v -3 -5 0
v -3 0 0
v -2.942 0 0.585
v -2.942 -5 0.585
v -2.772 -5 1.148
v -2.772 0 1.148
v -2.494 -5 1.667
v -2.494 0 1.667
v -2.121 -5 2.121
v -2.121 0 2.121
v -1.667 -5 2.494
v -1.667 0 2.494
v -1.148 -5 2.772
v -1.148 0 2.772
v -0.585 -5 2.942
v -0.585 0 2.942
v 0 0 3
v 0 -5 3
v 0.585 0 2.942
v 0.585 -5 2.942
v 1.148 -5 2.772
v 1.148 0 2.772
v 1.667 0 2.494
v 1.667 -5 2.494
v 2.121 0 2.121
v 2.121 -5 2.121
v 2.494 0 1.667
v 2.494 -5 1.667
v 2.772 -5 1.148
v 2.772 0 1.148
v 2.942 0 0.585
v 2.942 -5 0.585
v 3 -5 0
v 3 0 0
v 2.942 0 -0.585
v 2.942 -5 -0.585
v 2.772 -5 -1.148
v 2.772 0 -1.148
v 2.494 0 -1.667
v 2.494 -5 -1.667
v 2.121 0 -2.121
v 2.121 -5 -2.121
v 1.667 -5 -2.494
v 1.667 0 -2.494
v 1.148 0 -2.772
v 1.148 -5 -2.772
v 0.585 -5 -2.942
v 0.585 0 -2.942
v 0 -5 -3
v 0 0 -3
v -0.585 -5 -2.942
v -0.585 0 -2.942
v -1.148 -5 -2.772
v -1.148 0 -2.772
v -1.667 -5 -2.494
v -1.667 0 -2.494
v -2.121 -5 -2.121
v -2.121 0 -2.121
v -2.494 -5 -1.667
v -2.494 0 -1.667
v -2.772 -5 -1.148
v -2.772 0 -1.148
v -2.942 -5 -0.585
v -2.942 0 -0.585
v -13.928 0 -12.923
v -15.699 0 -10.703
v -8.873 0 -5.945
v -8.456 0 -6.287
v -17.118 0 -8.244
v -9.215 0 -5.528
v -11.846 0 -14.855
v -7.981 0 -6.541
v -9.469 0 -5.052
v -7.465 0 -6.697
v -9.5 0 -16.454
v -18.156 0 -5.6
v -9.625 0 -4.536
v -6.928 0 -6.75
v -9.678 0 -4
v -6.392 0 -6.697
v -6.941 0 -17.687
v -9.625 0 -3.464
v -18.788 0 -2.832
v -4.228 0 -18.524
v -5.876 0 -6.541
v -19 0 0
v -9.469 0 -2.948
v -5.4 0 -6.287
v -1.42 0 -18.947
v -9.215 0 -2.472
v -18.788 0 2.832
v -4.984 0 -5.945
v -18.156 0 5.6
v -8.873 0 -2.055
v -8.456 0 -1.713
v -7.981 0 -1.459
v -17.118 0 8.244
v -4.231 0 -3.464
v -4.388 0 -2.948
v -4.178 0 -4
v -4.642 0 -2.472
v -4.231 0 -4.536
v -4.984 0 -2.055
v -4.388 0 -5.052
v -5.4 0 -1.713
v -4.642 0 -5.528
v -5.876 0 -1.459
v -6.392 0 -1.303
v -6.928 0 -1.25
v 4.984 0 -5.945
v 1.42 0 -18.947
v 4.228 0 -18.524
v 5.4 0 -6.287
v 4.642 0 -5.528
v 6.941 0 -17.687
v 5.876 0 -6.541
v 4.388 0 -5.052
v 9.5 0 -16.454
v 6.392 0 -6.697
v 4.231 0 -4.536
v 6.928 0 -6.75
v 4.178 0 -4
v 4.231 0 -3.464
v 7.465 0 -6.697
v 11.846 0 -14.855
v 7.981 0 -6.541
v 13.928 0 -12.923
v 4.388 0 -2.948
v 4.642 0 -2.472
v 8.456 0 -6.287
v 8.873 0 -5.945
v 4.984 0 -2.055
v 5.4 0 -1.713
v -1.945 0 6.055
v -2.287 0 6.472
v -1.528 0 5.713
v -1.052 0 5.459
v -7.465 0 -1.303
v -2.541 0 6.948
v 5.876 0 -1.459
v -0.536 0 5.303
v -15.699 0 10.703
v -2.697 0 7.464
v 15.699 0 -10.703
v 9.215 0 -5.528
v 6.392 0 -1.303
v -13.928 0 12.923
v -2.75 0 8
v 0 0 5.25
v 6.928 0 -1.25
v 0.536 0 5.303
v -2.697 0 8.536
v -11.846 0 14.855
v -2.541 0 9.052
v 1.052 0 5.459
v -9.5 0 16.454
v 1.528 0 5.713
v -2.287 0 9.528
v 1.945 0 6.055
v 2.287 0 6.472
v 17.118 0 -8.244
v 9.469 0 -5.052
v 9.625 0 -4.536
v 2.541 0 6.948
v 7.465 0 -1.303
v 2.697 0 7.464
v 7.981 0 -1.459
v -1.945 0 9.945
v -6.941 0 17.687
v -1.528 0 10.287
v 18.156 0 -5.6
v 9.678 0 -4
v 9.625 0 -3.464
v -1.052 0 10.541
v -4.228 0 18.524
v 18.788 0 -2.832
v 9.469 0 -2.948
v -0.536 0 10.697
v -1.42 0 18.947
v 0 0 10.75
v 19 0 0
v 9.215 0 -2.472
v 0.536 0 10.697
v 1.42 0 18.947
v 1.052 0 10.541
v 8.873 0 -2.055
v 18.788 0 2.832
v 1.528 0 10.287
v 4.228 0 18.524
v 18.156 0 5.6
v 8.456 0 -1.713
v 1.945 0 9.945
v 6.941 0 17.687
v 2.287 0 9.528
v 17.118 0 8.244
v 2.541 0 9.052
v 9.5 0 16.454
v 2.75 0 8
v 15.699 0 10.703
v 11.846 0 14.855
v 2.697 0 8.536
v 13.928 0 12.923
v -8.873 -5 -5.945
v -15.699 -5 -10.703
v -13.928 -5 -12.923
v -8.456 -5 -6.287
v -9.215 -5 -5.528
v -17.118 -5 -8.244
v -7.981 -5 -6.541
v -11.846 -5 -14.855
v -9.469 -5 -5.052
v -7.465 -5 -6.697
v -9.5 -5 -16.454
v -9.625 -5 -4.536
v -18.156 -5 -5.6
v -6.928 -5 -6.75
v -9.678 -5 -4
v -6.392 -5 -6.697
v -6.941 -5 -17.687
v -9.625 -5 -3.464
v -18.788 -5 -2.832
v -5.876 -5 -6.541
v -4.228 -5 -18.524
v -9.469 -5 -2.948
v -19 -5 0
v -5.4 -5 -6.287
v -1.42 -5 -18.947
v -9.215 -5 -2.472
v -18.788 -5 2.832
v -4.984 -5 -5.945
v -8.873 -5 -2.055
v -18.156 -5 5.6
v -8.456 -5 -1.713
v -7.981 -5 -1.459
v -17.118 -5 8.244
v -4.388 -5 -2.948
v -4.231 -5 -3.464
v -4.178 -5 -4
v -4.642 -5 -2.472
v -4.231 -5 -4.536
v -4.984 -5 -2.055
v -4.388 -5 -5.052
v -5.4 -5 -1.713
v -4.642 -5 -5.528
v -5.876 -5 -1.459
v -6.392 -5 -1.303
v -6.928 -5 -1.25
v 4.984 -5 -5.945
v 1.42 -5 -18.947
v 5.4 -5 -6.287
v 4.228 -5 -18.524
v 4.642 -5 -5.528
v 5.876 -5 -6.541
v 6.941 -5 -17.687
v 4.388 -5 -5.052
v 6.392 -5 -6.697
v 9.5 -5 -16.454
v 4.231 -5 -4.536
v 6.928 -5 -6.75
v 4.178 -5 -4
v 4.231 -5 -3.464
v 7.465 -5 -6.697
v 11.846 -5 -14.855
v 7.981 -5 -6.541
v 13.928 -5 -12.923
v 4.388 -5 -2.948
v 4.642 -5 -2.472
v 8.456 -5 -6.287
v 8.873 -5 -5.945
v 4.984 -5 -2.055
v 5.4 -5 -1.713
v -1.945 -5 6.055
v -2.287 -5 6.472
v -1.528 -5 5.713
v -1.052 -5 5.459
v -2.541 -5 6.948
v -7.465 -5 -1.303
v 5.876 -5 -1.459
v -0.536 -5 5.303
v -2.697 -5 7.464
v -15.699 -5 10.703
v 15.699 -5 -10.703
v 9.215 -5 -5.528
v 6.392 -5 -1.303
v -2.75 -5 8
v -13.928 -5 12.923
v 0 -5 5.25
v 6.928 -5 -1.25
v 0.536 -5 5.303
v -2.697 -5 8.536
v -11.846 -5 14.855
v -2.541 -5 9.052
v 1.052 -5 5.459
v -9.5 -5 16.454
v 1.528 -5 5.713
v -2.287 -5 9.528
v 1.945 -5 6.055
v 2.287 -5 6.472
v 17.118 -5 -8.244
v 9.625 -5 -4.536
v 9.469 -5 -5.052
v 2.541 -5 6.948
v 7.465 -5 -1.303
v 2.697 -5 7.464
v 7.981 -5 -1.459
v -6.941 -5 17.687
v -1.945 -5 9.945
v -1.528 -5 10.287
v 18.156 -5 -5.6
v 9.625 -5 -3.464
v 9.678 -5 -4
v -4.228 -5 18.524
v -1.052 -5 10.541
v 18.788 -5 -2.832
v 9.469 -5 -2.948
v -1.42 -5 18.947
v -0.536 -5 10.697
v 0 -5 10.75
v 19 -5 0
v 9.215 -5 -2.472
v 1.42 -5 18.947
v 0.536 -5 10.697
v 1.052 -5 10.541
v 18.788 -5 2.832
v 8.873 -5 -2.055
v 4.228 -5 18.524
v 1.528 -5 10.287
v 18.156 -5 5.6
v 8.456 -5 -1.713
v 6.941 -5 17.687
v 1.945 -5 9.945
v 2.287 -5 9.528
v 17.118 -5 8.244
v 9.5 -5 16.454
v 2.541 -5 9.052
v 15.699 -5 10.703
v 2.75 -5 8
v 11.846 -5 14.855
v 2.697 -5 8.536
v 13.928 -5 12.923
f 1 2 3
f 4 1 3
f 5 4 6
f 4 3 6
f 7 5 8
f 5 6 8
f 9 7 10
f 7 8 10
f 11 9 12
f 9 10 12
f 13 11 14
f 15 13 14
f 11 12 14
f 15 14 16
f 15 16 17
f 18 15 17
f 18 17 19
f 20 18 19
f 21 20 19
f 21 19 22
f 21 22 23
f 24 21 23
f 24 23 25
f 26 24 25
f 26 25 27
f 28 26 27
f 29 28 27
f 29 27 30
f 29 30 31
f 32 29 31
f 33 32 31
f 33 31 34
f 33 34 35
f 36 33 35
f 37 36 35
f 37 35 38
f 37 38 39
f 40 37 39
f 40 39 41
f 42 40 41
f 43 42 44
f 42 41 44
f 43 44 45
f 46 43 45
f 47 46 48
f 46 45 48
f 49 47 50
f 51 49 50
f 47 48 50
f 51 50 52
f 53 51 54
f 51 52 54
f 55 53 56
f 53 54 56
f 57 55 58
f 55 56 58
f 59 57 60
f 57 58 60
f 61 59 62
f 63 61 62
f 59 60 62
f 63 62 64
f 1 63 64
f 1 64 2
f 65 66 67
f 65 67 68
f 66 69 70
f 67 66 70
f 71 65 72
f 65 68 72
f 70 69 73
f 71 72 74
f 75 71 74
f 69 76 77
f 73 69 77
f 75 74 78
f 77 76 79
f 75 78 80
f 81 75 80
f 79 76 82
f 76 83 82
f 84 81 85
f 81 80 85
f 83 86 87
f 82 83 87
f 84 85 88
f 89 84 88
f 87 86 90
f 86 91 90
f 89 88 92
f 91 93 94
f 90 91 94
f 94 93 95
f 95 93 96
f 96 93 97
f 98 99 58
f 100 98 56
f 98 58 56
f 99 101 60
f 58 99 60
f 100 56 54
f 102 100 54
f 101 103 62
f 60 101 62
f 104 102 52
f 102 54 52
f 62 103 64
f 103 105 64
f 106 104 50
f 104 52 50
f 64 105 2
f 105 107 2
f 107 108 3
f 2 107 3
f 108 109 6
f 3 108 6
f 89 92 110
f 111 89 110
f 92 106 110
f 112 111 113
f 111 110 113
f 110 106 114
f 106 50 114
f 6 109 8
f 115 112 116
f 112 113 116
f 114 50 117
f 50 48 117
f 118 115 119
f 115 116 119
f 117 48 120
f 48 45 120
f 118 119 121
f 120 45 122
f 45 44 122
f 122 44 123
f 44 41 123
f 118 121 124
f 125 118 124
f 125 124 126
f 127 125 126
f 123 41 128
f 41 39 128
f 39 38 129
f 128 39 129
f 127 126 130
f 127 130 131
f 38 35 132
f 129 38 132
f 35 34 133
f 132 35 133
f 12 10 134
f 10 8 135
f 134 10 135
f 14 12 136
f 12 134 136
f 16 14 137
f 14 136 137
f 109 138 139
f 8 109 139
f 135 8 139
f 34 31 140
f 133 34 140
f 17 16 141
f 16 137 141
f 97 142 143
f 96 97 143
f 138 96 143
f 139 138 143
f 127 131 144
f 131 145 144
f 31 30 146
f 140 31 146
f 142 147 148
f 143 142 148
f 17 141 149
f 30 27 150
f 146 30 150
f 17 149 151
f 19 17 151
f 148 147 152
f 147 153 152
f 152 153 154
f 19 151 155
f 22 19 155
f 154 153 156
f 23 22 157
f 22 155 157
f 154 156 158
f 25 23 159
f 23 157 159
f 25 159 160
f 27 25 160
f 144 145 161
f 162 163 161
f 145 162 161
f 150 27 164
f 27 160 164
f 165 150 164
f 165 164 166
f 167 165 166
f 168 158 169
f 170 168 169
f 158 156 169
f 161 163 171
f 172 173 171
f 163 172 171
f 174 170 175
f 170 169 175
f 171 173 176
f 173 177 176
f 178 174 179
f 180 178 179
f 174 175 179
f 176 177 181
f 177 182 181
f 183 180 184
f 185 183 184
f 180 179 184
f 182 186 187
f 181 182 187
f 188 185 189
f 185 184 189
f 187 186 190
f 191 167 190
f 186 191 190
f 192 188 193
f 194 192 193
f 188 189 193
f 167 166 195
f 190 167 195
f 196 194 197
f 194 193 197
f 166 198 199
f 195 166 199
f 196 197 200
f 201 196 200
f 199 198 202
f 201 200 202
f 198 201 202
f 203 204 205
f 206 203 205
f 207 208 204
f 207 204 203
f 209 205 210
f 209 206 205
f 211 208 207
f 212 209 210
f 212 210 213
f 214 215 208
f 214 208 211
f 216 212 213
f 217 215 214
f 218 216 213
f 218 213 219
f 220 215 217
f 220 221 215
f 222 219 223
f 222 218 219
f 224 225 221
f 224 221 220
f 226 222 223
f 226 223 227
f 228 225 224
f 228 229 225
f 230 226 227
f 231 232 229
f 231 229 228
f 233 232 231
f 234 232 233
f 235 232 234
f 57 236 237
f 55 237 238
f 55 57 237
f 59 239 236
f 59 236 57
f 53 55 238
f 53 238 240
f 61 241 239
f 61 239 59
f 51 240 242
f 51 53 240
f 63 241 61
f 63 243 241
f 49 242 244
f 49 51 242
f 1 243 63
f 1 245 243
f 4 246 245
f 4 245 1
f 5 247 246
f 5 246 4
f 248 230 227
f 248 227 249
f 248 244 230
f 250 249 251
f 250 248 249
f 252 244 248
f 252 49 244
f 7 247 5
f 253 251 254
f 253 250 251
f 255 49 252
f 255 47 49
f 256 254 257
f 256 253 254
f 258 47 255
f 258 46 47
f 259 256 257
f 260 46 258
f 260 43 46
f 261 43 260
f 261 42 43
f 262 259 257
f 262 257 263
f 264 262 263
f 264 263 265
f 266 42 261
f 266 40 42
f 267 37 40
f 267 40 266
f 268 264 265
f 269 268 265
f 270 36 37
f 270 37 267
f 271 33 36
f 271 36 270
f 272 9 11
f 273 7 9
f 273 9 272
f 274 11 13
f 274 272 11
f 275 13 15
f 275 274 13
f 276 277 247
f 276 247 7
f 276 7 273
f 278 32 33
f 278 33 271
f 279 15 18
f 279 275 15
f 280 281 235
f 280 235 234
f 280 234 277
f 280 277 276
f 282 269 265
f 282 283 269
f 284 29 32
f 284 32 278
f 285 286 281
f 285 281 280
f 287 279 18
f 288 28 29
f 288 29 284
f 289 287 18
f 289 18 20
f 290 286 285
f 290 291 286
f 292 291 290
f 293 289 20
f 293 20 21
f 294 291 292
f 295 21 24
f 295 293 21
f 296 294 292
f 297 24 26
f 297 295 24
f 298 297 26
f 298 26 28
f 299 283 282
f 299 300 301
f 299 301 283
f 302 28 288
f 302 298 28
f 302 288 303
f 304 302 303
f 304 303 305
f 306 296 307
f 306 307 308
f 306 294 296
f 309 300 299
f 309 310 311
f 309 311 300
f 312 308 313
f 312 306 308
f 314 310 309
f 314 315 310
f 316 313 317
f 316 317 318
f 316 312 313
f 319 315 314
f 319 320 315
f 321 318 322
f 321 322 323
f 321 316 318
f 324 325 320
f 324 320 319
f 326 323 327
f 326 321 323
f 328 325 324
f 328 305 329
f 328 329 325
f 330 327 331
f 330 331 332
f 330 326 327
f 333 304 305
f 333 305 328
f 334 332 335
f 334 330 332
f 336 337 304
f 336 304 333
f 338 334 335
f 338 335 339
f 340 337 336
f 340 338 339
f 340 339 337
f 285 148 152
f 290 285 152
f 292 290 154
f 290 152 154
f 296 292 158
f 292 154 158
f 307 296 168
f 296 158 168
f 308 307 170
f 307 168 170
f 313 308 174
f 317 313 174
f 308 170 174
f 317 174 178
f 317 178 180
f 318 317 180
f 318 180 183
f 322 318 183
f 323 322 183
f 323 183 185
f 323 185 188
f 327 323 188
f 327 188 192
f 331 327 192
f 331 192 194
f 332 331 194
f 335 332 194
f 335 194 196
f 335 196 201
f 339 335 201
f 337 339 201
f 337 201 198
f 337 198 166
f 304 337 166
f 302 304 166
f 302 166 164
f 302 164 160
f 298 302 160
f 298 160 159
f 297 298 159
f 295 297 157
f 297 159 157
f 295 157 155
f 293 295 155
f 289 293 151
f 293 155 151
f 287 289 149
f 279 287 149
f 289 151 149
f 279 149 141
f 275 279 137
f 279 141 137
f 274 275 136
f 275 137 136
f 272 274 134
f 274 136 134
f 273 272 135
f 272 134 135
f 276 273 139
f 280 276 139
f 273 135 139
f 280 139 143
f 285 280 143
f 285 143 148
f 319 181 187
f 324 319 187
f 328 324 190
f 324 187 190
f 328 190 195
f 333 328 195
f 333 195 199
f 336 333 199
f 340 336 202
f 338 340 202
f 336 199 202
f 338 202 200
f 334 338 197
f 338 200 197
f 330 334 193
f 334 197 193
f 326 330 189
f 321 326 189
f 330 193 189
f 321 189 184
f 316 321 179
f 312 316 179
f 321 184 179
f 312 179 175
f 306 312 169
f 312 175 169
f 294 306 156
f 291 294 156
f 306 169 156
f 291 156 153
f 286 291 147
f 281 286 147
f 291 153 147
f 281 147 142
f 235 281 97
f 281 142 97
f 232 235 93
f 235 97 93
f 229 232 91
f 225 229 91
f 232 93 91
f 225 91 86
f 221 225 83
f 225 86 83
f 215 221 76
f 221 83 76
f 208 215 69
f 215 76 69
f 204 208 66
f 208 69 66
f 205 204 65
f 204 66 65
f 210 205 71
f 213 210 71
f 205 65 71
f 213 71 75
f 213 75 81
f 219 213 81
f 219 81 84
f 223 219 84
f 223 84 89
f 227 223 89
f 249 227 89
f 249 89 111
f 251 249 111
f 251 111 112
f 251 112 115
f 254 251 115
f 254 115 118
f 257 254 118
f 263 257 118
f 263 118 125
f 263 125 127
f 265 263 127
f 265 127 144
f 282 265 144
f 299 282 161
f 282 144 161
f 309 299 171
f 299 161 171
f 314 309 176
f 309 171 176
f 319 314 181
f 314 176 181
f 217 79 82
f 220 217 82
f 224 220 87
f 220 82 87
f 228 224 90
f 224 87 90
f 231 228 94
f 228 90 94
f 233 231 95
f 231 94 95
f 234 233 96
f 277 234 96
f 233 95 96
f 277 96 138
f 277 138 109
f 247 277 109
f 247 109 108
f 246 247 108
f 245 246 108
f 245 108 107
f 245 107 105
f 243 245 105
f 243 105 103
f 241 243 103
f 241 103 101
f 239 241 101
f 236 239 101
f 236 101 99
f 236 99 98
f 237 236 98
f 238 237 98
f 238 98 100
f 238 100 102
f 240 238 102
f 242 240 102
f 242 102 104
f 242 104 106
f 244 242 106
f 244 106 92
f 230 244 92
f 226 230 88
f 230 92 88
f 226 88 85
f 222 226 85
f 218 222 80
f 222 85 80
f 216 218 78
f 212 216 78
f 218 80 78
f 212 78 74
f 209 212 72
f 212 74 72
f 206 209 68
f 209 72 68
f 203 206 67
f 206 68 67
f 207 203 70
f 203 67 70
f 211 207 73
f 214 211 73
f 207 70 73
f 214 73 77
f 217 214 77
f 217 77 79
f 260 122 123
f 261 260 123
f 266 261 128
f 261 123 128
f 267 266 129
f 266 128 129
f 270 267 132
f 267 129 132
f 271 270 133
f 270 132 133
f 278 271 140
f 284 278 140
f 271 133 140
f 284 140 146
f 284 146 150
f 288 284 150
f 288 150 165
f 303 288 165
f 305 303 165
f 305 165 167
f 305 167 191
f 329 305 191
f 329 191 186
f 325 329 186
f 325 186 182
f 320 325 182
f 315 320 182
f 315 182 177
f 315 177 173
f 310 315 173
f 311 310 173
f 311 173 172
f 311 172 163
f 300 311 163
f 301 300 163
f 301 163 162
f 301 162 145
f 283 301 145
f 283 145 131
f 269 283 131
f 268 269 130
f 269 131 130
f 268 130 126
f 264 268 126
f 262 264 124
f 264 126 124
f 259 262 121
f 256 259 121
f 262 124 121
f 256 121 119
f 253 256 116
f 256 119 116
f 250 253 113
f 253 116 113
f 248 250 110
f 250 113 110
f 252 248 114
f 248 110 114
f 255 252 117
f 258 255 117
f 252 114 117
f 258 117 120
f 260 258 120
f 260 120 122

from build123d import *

# Parameters (mm, degrees)
F0_R     = 19
F1_DEPTH = 5
F4_D     = 5.5
F6_D     = 6


# Not quite as in the source:
# - a feature names something its author has since deleted; it is built from what else it names


with BuildPart() as f1:
    # F0 (on Front) → F1 (new body)
    with BuildSketch(Plane.XZ):
        Circle(F0_R)
    extrude(amount=F1_DEPTH)

    # F4 (through all)
    with Locations(Plane.XZ.offset(5)):
        with Locations((-6.9282032303, -4), (0, 8), (6.9282032303, -4)):
            Hole(F4_D / 2)

    # F6 (through all)
    with Locations(Plane.XZ.offset(5)):
        with Locations((0, 0)):
            Hole(F6_D / 2)


solid = f1.part
